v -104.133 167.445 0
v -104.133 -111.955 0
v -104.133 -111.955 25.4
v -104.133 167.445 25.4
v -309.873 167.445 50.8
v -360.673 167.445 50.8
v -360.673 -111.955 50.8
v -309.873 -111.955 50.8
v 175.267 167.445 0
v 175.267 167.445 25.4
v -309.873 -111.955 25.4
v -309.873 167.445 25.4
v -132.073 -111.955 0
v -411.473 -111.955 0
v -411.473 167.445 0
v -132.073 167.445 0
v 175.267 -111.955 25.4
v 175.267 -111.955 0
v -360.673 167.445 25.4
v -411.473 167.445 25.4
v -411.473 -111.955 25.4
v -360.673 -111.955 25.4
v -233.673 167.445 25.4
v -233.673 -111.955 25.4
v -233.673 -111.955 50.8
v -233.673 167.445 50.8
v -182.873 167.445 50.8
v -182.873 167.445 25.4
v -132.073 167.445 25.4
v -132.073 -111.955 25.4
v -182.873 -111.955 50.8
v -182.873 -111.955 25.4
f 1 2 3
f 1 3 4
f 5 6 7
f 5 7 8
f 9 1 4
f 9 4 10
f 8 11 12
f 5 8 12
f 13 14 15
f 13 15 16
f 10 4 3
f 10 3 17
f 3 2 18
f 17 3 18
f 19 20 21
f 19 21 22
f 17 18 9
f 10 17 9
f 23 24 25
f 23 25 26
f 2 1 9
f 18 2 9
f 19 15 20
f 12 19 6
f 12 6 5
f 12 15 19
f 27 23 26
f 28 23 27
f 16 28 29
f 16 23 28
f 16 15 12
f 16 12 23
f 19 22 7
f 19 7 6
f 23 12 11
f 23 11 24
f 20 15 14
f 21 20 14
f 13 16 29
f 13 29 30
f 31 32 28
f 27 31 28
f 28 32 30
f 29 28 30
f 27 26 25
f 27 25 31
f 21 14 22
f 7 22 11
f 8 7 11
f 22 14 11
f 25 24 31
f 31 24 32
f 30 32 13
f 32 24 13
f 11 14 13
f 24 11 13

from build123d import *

# Parameters (mm, degrees)
F0_W     = 279.4
F0_H     = 279.4
F1_DEPTH = 25.4
F2_W     = 279.4
F2_H     = 279.4
F3_DEPTH = 25.4
F4_W     = 50.8
F4_H     = 279.4
F5_DEPTH = 25.4


with BuildPart() as f1:
    # F0 (on Top) → F1 (new body)
    with BuildSketch(Plane.XY):
        with Locations((35.566936, 27.745318)):
            Rectangle(F0_W, F0_H)
    extrude(amount=F1_DEPTH)


with BuildPart() as f3:
    # F2 (on face) → F3 (new body)
    with BuildSketch(Plane(origin=(0, 0, 0), x_dir=(1, 0, 0), z_dir=(0, 0, -1))):
        with Locations((-271.773155, -27.745317)):
            Rectangle(F2_W, F2_H)
    extrude(amount=-F3_DEPTH)

    # F4 (on face) → F5 (join)
    with BuildSketch(Plane.XY.offset(25.4)):
        with Locations((-335.273155, 27.745317)):
            Rectangle(F4_W, F4_H)
        with Locations((-208.273155, 27.745317)):
            Rectangle(F4_W, F4_H)
    extrude(amount=F5_DEPTH)


solid = Compound([f1.part, f3.part])
